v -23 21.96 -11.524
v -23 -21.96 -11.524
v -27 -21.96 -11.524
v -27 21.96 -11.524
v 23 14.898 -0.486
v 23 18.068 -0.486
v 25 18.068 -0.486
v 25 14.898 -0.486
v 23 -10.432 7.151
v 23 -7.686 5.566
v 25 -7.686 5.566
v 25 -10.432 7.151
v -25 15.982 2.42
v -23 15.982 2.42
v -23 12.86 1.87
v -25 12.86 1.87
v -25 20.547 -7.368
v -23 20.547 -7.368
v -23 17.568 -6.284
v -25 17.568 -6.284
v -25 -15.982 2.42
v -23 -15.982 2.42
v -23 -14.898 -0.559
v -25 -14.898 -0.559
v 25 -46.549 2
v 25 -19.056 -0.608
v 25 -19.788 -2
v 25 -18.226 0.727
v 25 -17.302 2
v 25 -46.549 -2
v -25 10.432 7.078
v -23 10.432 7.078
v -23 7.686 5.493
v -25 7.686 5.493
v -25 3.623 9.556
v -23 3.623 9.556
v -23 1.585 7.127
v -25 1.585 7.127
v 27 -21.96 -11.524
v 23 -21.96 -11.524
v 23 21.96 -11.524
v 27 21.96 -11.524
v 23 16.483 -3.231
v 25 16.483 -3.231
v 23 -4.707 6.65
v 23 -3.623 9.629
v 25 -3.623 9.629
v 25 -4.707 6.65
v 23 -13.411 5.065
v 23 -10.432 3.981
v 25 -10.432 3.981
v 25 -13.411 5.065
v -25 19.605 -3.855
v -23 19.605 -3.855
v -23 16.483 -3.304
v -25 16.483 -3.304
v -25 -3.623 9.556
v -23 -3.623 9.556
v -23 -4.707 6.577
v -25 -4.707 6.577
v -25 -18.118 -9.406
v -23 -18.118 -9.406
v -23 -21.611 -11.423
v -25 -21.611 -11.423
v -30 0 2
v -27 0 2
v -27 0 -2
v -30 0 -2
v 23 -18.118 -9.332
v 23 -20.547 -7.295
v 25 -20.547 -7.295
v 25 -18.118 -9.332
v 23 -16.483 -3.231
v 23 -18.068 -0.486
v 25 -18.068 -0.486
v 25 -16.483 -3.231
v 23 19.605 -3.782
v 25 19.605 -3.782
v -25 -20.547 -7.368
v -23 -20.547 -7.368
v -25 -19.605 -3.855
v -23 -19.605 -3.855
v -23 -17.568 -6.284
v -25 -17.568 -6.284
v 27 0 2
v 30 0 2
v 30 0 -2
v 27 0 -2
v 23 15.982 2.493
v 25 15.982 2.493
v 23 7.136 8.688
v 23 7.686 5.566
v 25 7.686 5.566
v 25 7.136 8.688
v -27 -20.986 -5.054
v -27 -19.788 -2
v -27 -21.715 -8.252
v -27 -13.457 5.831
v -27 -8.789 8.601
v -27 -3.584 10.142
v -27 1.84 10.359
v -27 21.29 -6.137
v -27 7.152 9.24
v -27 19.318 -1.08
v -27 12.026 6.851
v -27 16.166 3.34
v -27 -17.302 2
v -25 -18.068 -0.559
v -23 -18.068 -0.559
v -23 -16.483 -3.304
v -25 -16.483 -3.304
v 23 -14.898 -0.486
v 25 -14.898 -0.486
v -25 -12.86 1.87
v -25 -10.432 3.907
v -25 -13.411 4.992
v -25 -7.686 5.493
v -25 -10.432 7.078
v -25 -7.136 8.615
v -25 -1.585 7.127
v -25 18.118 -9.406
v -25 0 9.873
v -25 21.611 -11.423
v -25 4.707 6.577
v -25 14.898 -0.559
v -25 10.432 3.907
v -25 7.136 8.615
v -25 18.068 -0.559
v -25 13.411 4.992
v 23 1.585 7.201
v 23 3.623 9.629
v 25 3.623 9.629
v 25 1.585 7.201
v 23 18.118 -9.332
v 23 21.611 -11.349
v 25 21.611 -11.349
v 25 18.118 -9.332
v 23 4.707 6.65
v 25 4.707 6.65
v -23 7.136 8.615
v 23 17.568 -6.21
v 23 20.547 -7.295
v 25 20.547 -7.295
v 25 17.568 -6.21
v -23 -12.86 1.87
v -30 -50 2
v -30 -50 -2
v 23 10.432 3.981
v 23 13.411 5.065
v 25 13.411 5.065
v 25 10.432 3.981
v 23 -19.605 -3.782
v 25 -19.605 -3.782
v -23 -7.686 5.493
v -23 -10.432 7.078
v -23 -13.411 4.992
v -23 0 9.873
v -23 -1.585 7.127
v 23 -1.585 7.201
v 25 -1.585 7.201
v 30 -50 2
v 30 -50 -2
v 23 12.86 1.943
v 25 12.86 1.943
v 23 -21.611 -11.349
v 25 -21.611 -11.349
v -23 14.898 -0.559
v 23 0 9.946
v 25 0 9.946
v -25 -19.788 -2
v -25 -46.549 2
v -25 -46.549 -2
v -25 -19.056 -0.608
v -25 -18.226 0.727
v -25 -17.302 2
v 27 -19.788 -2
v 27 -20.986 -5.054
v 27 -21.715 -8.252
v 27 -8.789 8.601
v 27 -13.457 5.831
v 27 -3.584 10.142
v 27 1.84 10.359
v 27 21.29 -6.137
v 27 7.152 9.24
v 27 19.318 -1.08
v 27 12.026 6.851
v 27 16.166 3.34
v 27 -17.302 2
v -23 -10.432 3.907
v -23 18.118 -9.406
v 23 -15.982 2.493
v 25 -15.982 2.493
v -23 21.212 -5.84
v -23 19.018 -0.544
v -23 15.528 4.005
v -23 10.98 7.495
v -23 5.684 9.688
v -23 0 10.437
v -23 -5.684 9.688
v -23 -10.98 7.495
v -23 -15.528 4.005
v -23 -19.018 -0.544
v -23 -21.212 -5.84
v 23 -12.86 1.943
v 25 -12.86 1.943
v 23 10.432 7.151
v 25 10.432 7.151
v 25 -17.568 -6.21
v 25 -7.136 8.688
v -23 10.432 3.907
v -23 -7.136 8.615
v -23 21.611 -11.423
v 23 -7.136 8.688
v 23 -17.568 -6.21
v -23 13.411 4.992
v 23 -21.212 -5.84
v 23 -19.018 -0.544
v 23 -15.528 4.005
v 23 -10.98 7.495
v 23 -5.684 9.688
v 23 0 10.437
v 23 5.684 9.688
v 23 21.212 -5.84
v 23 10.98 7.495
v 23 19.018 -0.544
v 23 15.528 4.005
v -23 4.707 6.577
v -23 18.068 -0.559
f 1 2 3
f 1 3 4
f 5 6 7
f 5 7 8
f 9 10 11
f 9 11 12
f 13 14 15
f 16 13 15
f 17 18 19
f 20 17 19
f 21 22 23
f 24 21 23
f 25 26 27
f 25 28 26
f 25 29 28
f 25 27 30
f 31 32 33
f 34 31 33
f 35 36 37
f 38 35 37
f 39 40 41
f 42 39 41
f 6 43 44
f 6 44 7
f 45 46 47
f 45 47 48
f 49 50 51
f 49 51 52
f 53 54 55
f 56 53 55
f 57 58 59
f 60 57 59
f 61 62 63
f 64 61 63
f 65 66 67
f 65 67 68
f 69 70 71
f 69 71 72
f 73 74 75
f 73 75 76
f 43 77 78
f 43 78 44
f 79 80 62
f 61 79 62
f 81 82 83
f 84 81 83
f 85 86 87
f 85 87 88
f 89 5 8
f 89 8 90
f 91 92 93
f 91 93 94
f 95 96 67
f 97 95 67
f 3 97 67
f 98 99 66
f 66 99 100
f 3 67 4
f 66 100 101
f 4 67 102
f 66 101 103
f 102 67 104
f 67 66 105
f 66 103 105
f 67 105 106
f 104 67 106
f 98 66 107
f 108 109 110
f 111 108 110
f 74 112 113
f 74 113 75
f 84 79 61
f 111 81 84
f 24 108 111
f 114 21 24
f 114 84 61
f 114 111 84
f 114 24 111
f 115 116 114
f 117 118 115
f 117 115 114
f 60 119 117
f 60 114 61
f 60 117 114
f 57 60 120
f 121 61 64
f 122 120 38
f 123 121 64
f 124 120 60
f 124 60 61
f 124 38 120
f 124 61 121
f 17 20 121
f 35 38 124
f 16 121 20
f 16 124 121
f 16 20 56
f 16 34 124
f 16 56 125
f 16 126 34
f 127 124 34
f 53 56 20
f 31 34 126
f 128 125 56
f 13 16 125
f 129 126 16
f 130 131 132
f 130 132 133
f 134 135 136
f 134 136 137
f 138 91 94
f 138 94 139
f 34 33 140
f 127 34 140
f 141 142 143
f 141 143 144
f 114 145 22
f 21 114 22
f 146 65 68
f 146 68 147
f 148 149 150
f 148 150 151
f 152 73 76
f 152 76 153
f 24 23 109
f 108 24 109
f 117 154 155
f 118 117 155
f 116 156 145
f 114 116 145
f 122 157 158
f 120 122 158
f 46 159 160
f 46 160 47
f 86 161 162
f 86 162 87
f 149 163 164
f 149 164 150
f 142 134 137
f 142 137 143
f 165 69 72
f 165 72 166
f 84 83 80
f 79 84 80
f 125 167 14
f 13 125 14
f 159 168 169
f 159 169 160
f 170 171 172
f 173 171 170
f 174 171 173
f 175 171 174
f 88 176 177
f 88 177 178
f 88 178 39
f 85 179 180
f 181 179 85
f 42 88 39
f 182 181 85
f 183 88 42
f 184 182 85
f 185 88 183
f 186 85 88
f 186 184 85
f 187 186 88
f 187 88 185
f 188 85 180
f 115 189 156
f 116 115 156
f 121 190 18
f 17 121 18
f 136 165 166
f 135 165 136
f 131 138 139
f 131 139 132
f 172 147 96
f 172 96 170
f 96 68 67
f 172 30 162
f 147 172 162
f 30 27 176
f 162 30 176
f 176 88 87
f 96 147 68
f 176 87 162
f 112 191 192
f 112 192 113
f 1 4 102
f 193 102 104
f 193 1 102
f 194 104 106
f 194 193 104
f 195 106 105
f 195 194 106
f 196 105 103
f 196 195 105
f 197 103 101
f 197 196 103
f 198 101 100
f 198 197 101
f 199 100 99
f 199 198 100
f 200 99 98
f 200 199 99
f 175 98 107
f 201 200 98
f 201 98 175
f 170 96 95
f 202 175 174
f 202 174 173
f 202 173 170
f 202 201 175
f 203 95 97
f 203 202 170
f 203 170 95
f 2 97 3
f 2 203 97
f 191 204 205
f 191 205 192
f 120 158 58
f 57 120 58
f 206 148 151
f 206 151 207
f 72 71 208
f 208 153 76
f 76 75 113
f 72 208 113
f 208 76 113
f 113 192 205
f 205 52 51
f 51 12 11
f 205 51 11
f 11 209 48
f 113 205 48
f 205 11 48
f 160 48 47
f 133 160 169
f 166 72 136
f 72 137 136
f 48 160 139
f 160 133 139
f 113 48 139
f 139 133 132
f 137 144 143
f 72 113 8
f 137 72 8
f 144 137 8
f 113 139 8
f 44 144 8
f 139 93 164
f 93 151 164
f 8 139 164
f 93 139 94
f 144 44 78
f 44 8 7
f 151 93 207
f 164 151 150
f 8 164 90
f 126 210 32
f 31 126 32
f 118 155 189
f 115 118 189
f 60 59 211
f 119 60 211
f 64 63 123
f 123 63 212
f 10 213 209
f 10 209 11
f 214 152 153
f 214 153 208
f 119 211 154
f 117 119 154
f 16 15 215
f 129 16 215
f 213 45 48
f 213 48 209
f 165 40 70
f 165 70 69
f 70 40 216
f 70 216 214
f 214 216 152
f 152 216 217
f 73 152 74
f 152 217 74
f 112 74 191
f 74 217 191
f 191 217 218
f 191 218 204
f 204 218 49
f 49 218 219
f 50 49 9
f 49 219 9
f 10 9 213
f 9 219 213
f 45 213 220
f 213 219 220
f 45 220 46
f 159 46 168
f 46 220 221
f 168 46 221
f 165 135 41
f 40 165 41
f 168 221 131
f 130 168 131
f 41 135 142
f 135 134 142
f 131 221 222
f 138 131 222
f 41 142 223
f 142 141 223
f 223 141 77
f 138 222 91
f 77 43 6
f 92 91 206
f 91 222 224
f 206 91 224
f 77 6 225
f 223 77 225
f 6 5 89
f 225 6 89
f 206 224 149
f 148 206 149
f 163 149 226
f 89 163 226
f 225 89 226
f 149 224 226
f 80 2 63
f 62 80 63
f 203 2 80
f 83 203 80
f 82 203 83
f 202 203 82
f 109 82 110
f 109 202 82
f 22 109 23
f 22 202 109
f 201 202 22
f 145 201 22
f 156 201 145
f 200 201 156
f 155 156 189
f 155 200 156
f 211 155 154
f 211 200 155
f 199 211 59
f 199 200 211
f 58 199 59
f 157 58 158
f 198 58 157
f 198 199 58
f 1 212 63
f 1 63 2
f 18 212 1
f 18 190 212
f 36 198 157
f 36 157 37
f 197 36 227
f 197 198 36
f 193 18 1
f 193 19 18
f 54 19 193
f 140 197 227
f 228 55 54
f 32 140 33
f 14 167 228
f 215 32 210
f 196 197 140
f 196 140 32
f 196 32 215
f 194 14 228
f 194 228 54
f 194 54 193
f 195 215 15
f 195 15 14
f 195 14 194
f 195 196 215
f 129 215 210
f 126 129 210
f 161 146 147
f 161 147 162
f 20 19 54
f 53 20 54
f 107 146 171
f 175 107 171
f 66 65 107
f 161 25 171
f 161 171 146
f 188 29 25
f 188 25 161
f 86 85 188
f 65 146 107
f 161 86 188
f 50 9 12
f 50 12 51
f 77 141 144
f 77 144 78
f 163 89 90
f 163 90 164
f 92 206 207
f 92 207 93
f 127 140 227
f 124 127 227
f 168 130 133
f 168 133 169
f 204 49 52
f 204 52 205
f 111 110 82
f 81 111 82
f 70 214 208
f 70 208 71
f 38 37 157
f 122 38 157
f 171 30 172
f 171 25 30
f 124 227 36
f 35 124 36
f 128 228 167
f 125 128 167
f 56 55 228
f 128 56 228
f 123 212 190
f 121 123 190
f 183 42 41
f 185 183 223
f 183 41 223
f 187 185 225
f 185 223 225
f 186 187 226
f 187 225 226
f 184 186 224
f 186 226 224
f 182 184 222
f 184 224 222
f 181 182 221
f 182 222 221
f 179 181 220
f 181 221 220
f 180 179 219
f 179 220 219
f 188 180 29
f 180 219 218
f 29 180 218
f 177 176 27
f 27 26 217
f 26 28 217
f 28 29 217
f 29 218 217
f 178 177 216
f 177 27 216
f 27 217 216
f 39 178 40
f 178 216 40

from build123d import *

# Parameters (mm, degrees)
F0_W      = 40
F0_H      = 60
F1_DEPTH  = 20
F2_W      = 26
F2_H      = 58
F3_DEPTH  = 10
F5_DEPTH  = 5
F14_DEPTH = 4
F15_DEPTH = 2
F16_DEPTH = 4
F17_DEPTH = 2
F20_DEPTH = 2


with BuildPart() as f1:
    # F0 (on Top) → F1 (new body)
    with BuildSketch(Plane.XY):
        Rectangle(F0_W, F0_H)
    extrude(amount=F1_DEPTH)

    # F2 (on face) → F3 (cut)
    with BuildSketch(Plane.XY.offset(20)):
        with Locations((0, -1)):
            Rectangle(F2_W, F2_H)
    extrude(amount=-F3_DEPTH, mode=Mode.SUBTRACT)

    # F4 (on face) → F5 (join)
    with BuildSketch(Plane.YZ.offset(20)):
        Polygon((10, 17.3205080757), (7.368124542, 15.8009940716), (6.8404028665, 18.7938524157), (4.5123723483, 16.8404028665), (3.4729635533, 19.6961550602), (1.5195140041, 17.368124542), (0, 20), (-1.5195140041, 17.368124542), (-3.4729635533, 19.6961550602), (-4.5123723483, 16.8404028665), (-6.8404028665, 18.7938524157), (-7.368124542, 15.8009940716), (-10, 17.3205080757), (-10, 14.2814800674), (-12.8557521937, 15.3208888624), (-12.3280305182, 12.3280305182), (-15.3208888624, 12.8557521937), (-14.2814800674, 10), (-17.3205080757, 10), (-15.8009940716, 7.368124542), (-18.7938524157, 6.8404028665), (-16.8404028665, 4.5123723483), (-19.6961550602, 3.4729635533), (-17.368124542, 1.5195140041), (-20, 0), (20, 0), (17.368124542, 1.5195140041), (19.6961550602, 3.4729635533), (16.8404028665, 4.5123723483), (18.7938524157, 6.8404028665), (15.8009940716, 7.368124542), (17.3205080757, 10), (14.2814800674, 10), (15.3208888624, 12.8557521937), (12.3280305182, 12.3280305182), (12.8557521937, 15.3208888624), (10, 14.2814800674), align=None)
    extrude(amount=F5_DEPTH)

    # F6: F1 across plane


with BuildPart() as f1_1:
    add(f1.part)
    add(f1.part.mirror(Plane.YZ))


with BuildPart() as f14:
    # F12 (on offset) → F14 (new body)
    with BuildSketch(Plane.YZ.offset(-23)):
        with BuildLine():
            Line((-21.9604505755, -11.5237375721), (21.9604505755, -11.5237375721))
            ThreePointArc((21.9604505755, -11.5237375721), (0, 10.4367130033), (-21.9604505755, -11.5237375721))
        make_face()
    extrude(amount=-F14_DEPTH)


with BuildPart() as f15_tool:
    # F10 (on offset) → F15 (new body)
    with BuildSketch(Plane.YZ.offset(-23)):
        Polygon((13.4108637106, 4.9916980332), (10.4318001067, 3.9074075554), (10.4318001067, 7.0776608255), (7.6862802384, 5.4925341904), (7.1357715353, 8.6146241898), (4.7072166344, 6.5768246682), (3.6229261566, 9.5558882722), (1.585126635, 7.1273333713), (0, 9.8728532397), (-1.585126635, 7.1273333713), (-3.6229261566, 9.5558882722), (-4.7072166344, 6.5768246682), (-7.1357715353, 8.6146241898), (-7.6862802384, 5.4925341904), (-10.4318001067, 7.0776608255), (-10.4318001067, 3.9074075554), (-13.4108637106, 4.9916980332), (-12.8603550075, 1.8696080338), (-15.9824450069, 2.4201167369), (-14.8981545291, -0.558946867), (-18.0684077992, -0.558946867), (-16.4832811642, -3.3044667354), (-19.6053711636, -3.8549754385), (-17.567571642, -6.2835303393), (-20.5466352459, -7.3678208171), (-18.1180803451, -9.4056203387), (-21.6114999369, -11.4225470804), (21.6114999369, -11.4225470804), (18.1180803451, -9.4056203387), (20.5466352459, -7.3678208171), (17.567571642, -6.2835303393), (19.6053711636, -3.8549754385), (16.4832811642, -3.3044667354), (18.0684077992, -0.558946867), (14.8981545291, -0.558946867), (15.9824450069, 2.4201167369), (12.8603550075, 1.8696080338), align=None)
    extrude(amount=-F15_DEPTH)


with BuildPart() as f1_2:
    add(f1_1.part)

    # F15: cut by f15_tool
    add(f15_tool.part, mode=Mode.SUBTRACT)


with BuildPart() as f14_1:
    add(f14.part)

    # F15: cut by f15_tool
    add(f15_tool.part, mode=Mode.SUBTRACT)



with BuildPart() as f16:
    # F13 (on offset) → F16 (new body)
    with BuildSketch(Plane.YZ.offset(23)):
        with BuildLine():
            Line((-21.9604505755, -11.5237375721), (21.9604505755, -11.5237375721))
            ThreePointArc((21.9604505755, -11.5237375721), (0, 10.4367130033), (-21.9604505755, -11.5237375721))
        make_face()
    extrude(amount=F16_DEPTH)


with BuildPart() as f17_tool:
    # F11 (on offset) → F17 (new body)
    with BuildSketch(Plane.YZ.offset(23)):
        Polygon((13.4108637106, 5.0649986808), (10.4318001067, 3.980708203), (10.4318001067, 7.1509614731), (7.6862802384, 5.565834838), (7.1357715353, 8.6879248374), (4.7072166344, 6.6501253158), (3.6229261566, 9.6291889197), (1.585126635, 7.2006340189), (0, 9.9461538872), (-1.585126635, 7.2006340189), (-3.6229261566, 9.6291889197), (-4.7072166344, 6.6501253158), (-7.1357715353, 8.6879248374), (-7.6862802384, 5.565834838), (-10.4318001067, 7.1509614731), (-10.4318001067, 3.980708203), (-13.4108637106, 5.0649986808), (-12.8603550075, 1.9429086814), (-15.9824450069, 2.4934173845), (-14.8981545291, -0.4856462195), (-18.0684077992, -0.4856462195), (-16.4832811642, -3.2311660878), (-19.6053711636, -3.7816747909), (-17.567571642, -6.2102296917), (-20.5466352459, -7.2945201695), (-18.1180803451, -9.3323196911), (-21.6114999369, -11.3492464328), (21.6114999369, -11.3492464328), (18.1180803451, -9.3323196911), (20.5466352459, -7.2945201695), (17.567571642, -6.2102296917), (19.6053711636, -3.7816747909), (16.4832811642, -3.2311660878), (18.0684077992, -0.4856462195), (14.8981545291, -0.4856462195), (15.9824450069, 2.4934173845), (12.8603550075, 1.9429086814), align=None)
    extrude(amount=F17_DEPTH)


with BuildPart() as f1_3:
    add(f1_2.part)

    # F17: cut by f17_tool
    add(f17_tool.part, mode=Mode.SUBTRACT)


with BuildPart() as f16_1:
    add(f16.part)

    # F17: cut by f17_tool
    add(f17_tool.part, mode=Mode.SUBTRACT)


with BuildPart() as f14_2:
    add(f14_1.part)

    add(f16_1.part)  # F20 merges F16
    # F19 (on Top) → F20 (join, symmetric)
    with BuildSketch(Plane.XY):
        Polygon((-25, 0), (-30, 0), (-30, -50), (30, -50), (30, 0), (25, 0), (25, -46.5494953096), (-25, -46.5494953096), align=None)
    extrude(amount=F20_DEPTH, both=True)


solid = f14_2.part
